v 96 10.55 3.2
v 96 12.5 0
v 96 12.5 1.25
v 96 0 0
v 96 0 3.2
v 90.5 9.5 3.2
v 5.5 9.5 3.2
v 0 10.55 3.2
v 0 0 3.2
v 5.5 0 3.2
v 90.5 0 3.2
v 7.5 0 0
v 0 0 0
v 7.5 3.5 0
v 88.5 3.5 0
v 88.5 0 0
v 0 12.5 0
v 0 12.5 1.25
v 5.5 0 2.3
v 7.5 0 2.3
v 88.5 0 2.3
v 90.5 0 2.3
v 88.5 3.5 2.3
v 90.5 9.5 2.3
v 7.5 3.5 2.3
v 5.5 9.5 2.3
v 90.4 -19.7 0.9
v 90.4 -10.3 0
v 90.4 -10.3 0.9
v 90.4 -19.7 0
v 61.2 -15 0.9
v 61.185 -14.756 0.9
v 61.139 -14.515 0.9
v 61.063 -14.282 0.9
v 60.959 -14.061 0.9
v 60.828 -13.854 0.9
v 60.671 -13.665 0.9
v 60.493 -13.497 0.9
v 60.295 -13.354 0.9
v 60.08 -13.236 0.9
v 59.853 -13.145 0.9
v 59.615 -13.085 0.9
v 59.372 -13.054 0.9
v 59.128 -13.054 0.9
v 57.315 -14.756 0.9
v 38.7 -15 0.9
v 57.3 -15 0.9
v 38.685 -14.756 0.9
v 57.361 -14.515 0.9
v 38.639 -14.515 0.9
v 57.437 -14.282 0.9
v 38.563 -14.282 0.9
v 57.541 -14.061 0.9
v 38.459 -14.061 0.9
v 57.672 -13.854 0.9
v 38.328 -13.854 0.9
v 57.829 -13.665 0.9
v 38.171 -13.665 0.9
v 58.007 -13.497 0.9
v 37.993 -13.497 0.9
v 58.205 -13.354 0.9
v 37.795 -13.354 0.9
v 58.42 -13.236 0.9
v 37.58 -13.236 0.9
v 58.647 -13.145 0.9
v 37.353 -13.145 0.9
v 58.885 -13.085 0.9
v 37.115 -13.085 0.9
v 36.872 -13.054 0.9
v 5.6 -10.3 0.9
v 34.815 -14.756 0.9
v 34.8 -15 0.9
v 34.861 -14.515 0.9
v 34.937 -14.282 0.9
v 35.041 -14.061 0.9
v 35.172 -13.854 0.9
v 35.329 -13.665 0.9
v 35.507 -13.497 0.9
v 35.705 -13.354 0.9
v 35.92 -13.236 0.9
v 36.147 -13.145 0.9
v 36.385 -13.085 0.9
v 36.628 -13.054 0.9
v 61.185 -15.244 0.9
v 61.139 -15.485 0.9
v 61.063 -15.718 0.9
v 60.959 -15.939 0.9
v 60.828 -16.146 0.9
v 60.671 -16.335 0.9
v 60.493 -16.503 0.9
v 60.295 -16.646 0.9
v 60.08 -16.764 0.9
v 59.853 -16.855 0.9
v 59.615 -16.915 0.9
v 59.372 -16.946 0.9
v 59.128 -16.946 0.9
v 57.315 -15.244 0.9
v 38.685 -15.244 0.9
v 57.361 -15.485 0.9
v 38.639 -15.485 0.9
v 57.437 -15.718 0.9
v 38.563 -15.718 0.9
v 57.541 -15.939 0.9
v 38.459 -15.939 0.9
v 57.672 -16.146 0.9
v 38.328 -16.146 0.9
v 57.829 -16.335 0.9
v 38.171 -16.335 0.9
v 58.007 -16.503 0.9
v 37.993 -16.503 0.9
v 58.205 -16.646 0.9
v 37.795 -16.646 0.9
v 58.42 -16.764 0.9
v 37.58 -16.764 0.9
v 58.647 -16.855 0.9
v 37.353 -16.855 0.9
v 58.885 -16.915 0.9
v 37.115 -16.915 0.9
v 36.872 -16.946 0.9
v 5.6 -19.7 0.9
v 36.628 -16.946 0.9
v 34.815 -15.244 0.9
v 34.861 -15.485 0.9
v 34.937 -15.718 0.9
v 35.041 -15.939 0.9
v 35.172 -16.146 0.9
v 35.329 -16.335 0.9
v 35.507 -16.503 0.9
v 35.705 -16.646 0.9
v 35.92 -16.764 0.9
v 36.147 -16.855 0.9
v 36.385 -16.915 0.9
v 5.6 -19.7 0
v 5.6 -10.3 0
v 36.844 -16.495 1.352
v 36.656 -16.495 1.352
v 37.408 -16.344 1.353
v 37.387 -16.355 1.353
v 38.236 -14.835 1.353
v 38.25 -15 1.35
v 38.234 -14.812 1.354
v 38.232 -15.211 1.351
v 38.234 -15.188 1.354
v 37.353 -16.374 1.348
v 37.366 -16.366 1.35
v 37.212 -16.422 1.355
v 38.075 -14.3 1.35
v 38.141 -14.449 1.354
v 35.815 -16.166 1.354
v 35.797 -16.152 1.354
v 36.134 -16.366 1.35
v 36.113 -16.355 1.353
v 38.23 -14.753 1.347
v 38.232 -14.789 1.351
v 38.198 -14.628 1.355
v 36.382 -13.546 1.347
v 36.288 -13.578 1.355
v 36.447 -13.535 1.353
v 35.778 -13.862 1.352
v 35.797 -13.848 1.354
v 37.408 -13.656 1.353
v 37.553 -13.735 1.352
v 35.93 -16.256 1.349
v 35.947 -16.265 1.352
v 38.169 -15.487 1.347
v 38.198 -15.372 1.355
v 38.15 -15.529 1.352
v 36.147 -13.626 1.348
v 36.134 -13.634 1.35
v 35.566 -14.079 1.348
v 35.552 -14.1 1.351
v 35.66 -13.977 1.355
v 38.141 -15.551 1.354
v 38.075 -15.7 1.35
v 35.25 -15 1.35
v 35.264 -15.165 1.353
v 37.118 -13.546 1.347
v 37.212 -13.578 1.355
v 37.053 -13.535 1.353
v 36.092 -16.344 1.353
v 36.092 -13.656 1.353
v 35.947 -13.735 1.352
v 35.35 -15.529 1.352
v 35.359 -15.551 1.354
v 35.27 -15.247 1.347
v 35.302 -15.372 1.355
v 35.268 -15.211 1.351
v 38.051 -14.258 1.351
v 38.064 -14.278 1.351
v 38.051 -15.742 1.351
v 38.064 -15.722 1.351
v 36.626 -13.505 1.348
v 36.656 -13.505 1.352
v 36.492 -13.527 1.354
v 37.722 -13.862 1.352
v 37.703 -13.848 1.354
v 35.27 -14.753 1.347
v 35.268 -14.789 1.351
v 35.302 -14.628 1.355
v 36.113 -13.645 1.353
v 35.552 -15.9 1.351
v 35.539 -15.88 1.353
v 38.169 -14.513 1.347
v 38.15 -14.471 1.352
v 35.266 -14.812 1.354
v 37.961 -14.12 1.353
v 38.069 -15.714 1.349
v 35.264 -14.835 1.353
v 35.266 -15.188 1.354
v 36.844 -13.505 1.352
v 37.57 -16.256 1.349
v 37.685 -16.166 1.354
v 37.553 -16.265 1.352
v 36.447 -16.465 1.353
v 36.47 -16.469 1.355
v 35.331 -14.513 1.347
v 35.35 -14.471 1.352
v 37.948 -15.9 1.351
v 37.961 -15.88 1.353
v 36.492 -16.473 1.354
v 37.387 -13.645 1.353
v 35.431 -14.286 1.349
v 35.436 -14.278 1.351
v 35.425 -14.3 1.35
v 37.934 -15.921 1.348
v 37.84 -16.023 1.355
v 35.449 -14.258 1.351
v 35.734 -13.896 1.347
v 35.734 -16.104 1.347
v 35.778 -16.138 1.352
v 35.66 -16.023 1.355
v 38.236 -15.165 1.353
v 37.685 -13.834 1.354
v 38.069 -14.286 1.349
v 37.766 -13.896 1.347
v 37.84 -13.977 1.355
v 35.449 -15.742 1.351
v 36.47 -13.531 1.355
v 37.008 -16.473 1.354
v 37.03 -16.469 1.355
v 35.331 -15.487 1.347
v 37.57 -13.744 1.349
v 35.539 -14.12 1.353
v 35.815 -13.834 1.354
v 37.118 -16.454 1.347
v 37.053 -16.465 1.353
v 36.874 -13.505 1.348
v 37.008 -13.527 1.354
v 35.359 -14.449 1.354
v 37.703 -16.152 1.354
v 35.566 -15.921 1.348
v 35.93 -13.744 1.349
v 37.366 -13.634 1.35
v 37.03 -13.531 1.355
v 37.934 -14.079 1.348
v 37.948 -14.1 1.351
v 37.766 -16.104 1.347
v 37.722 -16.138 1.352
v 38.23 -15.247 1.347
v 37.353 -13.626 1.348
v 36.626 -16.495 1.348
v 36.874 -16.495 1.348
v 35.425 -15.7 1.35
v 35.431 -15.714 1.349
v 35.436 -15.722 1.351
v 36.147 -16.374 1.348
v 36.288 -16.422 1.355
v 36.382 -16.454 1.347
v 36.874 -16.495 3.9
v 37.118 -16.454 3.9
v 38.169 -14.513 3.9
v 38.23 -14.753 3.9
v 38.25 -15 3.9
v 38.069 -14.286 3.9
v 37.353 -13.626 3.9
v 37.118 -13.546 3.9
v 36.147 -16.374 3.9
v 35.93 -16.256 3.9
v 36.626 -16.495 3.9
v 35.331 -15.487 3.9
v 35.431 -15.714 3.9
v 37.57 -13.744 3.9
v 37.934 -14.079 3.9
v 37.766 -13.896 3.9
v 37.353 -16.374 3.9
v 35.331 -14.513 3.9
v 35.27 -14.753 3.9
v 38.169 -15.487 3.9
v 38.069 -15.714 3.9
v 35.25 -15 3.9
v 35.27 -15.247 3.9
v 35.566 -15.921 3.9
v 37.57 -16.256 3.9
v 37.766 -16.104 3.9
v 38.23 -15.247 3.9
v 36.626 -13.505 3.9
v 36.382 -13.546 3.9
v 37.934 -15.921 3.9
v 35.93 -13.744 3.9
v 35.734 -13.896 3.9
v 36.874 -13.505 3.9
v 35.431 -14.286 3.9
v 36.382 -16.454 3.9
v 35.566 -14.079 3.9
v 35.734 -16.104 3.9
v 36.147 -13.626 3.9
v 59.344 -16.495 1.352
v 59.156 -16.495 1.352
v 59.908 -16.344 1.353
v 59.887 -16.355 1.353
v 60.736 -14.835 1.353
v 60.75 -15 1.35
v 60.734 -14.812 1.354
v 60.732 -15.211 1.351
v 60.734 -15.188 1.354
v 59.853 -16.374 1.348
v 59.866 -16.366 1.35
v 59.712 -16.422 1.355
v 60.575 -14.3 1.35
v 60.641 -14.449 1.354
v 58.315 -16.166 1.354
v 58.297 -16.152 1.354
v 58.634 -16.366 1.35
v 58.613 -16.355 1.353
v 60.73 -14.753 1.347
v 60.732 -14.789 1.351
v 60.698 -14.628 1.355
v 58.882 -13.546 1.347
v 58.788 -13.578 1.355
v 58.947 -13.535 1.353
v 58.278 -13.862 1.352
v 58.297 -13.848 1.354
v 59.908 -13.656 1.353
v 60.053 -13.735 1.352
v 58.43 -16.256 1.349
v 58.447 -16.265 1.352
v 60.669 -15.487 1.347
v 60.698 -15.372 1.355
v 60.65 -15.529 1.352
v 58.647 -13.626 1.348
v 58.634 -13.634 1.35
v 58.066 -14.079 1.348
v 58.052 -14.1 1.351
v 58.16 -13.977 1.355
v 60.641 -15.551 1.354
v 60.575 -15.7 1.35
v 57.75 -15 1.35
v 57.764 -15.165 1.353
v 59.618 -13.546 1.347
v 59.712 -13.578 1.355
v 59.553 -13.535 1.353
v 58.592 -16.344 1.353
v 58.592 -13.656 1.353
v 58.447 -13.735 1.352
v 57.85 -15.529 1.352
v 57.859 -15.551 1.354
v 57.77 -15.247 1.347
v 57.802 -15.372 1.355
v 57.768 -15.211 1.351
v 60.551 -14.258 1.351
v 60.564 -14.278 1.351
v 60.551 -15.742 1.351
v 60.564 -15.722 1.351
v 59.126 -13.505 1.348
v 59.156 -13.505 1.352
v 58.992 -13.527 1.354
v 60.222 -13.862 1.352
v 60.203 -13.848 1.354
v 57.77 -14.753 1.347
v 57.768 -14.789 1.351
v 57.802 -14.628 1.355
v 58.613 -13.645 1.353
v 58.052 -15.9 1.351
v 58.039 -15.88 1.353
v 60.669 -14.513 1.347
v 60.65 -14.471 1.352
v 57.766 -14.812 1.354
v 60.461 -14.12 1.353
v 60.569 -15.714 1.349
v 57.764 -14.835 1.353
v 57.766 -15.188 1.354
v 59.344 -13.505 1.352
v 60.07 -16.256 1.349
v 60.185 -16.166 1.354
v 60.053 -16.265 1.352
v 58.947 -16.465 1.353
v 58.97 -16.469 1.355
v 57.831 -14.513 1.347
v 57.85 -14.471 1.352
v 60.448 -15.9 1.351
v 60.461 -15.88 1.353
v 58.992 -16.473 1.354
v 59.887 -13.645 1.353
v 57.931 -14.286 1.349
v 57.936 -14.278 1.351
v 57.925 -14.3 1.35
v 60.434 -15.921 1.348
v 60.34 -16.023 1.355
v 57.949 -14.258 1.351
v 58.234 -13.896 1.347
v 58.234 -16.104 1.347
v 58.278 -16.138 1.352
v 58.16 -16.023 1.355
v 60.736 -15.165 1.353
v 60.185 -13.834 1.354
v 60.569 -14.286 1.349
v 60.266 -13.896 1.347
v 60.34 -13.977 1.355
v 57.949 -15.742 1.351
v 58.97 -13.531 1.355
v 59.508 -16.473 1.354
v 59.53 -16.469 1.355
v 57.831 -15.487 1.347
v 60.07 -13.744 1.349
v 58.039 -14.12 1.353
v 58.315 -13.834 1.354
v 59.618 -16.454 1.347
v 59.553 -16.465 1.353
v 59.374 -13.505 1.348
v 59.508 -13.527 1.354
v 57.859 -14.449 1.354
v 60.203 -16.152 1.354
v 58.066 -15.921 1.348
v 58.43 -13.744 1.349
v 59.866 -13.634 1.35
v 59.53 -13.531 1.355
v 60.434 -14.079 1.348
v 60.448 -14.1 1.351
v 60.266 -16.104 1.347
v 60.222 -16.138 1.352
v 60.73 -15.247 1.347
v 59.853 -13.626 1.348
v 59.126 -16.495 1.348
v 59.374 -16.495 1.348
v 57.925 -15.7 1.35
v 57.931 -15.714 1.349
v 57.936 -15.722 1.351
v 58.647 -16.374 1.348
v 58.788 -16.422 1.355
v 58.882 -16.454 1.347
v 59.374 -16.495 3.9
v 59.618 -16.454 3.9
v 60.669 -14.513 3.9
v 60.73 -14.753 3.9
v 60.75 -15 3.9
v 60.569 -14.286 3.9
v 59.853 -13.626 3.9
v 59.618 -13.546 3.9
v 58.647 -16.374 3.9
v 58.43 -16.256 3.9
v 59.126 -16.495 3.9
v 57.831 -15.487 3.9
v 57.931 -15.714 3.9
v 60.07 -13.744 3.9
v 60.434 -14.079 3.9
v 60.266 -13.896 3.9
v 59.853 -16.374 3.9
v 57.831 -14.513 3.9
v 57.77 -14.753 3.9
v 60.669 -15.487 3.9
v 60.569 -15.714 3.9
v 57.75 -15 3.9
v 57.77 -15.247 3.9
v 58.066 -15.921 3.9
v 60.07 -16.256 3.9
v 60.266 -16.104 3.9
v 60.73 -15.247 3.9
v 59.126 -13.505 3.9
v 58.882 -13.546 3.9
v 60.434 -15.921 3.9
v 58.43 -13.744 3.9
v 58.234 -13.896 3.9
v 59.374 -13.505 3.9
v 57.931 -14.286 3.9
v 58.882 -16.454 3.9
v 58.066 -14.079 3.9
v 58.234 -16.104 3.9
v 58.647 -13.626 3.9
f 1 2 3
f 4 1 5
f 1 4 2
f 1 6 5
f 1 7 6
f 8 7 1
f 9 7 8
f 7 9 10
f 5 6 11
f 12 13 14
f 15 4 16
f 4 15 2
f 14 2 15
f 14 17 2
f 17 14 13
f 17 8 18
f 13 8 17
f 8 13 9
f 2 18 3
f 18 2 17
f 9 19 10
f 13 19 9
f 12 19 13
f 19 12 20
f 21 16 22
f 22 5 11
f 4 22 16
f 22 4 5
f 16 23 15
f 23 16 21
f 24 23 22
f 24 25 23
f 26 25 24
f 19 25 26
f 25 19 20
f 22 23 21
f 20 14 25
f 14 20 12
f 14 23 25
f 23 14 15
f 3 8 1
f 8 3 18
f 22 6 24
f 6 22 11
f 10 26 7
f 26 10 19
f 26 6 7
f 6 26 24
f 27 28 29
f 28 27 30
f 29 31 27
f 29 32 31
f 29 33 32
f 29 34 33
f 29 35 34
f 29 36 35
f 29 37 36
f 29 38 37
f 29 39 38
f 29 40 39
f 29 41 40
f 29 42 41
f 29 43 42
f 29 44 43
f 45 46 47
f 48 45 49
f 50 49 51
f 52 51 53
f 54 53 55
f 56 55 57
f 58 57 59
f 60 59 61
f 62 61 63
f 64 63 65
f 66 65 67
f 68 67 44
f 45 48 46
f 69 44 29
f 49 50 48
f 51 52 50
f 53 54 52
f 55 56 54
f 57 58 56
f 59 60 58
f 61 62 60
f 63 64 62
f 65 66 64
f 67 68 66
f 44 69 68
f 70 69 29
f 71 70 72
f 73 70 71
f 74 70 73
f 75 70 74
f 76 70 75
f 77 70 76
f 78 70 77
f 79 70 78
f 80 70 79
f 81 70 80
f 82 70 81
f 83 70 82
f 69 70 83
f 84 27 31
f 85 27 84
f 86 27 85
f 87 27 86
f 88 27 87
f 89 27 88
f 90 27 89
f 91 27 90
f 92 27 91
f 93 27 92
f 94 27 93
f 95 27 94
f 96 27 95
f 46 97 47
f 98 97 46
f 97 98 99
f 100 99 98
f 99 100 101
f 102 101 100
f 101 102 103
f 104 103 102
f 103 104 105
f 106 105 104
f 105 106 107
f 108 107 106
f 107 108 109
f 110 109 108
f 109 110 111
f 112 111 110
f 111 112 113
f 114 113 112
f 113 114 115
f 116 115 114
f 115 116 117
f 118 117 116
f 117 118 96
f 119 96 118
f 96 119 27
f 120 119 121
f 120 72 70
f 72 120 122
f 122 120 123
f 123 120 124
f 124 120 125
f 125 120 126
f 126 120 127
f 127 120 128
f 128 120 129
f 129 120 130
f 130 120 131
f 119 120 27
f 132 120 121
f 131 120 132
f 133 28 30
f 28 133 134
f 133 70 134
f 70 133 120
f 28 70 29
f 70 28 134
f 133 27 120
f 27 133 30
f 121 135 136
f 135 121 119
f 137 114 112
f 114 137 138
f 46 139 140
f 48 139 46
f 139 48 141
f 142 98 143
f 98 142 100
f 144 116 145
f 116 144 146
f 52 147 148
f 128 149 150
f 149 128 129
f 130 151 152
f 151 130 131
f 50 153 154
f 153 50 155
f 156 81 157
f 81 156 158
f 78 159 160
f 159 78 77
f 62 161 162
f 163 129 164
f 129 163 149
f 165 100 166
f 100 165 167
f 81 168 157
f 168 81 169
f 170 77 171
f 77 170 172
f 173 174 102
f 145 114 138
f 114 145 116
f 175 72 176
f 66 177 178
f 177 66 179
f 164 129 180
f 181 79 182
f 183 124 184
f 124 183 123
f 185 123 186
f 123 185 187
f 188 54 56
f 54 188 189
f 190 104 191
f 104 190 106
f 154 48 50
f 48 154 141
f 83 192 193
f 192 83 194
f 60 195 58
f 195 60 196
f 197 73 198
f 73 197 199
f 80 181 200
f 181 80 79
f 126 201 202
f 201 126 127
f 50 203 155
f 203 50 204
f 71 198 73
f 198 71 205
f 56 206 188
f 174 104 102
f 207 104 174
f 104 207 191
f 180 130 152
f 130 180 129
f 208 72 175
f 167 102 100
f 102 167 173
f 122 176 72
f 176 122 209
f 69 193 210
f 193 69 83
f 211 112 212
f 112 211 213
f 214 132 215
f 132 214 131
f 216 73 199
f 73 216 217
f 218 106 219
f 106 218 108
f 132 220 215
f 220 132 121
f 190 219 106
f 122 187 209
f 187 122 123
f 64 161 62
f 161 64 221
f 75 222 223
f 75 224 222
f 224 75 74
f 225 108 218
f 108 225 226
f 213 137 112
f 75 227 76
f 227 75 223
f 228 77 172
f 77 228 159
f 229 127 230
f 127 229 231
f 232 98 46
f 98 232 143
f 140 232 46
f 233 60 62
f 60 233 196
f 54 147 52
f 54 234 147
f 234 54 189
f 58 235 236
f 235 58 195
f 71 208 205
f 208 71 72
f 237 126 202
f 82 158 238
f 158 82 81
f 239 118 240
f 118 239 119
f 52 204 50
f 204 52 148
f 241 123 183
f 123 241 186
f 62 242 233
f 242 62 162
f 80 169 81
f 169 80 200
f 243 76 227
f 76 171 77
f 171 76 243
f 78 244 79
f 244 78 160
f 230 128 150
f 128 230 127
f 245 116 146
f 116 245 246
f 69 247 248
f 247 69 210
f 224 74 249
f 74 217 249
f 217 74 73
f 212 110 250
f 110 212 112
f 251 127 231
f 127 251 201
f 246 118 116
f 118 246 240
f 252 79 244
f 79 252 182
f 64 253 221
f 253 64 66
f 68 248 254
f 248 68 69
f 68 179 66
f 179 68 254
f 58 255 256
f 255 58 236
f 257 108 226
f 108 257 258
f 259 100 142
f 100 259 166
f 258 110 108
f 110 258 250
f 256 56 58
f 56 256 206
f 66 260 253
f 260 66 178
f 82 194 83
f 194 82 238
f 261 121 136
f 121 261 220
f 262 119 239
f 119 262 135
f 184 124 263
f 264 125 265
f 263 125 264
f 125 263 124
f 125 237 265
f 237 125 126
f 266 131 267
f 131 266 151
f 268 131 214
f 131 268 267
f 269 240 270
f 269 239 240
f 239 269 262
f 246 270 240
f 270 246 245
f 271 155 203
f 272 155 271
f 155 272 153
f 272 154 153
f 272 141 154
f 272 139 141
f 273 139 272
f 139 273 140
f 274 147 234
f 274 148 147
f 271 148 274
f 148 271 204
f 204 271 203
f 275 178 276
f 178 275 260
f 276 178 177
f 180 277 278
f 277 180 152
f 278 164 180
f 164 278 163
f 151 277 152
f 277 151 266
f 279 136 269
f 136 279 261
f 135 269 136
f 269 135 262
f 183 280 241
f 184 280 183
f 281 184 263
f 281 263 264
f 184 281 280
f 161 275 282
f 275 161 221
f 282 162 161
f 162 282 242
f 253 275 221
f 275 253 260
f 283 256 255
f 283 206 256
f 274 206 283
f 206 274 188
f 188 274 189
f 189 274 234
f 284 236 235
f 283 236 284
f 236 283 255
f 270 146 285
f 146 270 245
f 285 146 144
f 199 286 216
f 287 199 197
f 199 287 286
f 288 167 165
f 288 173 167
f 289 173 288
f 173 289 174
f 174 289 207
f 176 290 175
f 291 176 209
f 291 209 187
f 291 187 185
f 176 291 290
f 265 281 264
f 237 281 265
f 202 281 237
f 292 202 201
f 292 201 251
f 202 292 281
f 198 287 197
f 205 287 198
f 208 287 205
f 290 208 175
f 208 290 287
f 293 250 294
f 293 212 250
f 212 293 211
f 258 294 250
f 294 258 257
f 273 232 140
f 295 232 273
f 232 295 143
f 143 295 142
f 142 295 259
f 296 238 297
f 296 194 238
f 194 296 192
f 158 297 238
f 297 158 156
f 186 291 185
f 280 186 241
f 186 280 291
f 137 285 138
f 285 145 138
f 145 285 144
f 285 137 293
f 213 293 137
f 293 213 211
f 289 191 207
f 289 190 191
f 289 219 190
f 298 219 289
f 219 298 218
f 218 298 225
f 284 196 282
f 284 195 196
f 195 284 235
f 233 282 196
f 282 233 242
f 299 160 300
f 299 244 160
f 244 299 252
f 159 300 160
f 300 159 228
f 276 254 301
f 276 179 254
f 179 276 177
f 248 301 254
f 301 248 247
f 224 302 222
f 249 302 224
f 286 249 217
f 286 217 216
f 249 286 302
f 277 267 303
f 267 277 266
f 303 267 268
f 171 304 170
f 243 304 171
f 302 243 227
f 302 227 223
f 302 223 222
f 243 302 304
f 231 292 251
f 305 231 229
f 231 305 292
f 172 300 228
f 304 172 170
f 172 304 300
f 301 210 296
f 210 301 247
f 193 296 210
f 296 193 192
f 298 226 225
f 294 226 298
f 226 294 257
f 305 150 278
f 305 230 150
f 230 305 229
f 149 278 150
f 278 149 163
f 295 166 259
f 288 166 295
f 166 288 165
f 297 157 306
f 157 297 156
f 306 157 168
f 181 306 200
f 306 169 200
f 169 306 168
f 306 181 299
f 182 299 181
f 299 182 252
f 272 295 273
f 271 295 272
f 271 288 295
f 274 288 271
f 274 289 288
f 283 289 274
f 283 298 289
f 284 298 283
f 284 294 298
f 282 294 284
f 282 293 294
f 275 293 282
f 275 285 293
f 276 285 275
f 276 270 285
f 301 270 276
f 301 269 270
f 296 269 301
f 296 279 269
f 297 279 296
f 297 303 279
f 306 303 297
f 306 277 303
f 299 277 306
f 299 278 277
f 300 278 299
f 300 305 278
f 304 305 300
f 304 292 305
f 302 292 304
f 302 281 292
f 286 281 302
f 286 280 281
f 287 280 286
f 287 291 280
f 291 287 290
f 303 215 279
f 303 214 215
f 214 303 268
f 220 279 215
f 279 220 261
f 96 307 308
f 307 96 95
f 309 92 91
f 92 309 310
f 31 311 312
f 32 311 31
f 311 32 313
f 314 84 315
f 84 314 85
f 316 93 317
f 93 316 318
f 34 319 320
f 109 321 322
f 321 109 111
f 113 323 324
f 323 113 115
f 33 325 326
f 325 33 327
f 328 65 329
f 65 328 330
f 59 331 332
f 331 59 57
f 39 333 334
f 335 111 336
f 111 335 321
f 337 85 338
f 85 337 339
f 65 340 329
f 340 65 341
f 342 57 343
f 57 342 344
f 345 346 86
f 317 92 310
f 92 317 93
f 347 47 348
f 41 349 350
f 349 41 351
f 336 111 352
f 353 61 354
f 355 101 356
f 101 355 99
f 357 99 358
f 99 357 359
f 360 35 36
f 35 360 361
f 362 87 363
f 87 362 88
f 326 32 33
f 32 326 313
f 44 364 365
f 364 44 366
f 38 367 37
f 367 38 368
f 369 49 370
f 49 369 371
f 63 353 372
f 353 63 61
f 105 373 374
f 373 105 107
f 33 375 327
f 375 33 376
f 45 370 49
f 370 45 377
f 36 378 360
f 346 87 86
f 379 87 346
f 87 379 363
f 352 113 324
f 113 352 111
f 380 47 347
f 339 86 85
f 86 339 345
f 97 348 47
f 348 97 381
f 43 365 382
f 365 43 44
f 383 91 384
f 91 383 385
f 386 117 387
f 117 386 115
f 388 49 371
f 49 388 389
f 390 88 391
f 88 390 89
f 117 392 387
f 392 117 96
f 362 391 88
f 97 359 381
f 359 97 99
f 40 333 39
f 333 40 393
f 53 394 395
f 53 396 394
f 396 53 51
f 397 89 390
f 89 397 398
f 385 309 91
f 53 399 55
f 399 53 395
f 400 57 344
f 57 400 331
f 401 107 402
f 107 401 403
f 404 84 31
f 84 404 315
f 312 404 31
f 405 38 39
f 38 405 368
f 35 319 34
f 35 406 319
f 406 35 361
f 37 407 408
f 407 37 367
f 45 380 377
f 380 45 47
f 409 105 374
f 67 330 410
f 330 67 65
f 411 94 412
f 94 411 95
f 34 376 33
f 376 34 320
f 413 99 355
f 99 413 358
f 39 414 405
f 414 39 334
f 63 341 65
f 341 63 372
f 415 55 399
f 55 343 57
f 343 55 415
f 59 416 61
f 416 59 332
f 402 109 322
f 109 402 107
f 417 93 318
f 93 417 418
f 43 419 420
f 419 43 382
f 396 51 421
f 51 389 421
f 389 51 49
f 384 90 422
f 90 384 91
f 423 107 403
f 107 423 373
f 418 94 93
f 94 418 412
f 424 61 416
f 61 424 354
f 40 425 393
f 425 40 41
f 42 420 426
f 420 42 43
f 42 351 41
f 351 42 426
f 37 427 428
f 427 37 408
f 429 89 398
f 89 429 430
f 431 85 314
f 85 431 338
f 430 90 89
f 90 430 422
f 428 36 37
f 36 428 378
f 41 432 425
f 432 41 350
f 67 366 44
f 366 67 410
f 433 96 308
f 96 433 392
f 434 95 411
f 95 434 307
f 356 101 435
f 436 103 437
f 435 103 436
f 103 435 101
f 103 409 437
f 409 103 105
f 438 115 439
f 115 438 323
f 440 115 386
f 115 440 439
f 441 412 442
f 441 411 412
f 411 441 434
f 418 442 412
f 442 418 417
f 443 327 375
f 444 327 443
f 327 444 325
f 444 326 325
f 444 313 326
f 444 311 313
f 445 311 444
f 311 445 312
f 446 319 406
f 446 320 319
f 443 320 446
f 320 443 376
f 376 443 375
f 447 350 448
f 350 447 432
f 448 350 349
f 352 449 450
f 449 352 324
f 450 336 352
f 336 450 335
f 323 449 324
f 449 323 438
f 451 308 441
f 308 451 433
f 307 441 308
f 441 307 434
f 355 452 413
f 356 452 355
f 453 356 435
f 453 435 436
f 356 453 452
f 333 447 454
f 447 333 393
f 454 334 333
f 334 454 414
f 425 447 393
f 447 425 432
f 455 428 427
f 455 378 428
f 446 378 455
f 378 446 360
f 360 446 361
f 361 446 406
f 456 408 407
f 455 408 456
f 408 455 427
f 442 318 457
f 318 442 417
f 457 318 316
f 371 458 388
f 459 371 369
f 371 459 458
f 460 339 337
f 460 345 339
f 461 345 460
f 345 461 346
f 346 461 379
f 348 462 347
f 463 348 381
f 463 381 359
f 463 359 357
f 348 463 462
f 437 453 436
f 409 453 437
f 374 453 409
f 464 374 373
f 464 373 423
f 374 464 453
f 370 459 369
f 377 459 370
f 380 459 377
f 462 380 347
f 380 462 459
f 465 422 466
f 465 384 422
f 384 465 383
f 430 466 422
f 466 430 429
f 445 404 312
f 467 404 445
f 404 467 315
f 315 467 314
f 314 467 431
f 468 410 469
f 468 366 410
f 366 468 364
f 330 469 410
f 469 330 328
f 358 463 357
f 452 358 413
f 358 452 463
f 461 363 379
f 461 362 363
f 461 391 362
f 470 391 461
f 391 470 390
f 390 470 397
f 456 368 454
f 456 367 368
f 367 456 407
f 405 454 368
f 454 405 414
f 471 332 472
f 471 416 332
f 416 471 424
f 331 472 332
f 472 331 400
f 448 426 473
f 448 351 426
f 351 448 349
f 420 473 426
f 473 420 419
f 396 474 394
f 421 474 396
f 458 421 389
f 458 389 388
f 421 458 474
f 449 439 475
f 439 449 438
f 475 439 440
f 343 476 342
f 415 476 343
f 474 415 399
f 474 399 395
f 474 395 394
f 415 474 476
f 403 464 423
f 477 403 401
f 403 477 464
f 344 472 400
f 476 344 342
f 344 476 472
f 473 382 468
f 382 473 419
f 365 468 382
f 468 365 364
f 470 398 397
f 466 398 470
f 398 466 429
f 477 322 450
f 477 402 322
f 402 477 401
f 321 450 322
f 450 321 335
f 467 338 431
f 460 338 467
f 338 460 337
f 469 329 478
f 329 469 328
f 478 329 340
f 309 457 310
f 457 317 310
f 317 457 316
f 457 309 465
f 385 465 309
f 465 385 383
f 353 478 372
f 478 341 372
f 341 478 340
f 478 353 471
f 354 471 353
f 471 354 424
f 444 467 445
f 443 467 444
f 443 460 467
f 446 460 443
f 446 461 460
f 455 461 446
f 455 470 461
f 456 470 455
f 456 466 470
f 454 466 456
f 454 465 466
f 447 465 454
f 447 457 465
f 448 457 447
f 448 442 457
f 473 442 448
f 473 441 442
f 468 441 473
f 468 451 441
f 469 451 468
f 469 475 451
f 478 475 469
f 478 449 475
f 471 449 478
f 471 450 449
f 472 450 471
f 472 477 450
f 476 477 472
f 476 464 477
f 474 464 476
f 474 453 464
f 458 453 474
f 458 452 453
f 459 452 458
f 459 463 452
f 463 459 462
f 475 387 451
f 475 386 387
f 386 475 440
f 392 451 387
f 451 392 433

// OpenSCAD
/* HP Front Panel Top Trim (single unit width)
 * 
 * Works with 59303A DAC, which is a mid-70's half-width unit (half the width of, say, a 3478A)
 *
 * Two model options are provided: "single model" and "separated model"
 *
 * For SLA printers the "single model" will probably be best, since layering isn't an issue there.
 *
 * For FDM printers the "split model" is nice, since it eliminates the need for printing overhangs and makes 
 *   the visible surface of both the panel and its recessed portion nice looking, especially if you're using
 *   a textured printing surface for printing. This model can easily be glued together with CA glue or your
 *   adhesive of choice
 */
 
/*[ Panel Dimensions]*/ 
// HP 59303A Dimensions
panel_length = 96;
panel_width = 12.5;
panel_depth = 3.2;

/*[ Panel Lip Dimensions]*/
// HP 59303A Dimensions
lip_length = 81;
lip_width = 3.5;
lip_depth = 2.3;

/*[ Panel Bezel Dimensions]*/
// HP 59303A Dimensions
bezel_z_offset = 0.75;
bezel_y_offset = 13;
bezel_rotation = 45;

/*[ Post Positions and Dimensions]*/
// HP 59303A Dimensions
center_post = false;
post_spacing = 11.25;  // From center point
post_depth = 3;
post_diameter = 2.9;
post_bezel_height = 0.5;

/*[ Split Model Dimensions]*/
// HP 59303A Dimensions
model_two_y_offset = -15;
split_length = 85;
split_width = 9.5;
split_tolerance = 0.1;

module __customizer_limit__() {} // End Customizer vars
// Global Variables
$fs = 0.25; // Set facet size to 0.02mm for relatively high arc resolution
$fa = 5;  // Set max facet angle to 2.5 degrees for relatively high arc resolution

lip_thickness = panel_depth - lip_depth;

// Initial Model
module single_model() {
    union() {
        
        // Main panel and cutouts
        difference() {
            // Main panel
            cube([panel_length, panel_width, panel_depth]);
            
            // Lip Cutout
            translate([panel_length/2, lip_width/2, lip_depth/2]) 
                cube([lip_length, lip_width, lip_depth], center = true);
            
            // Bottom-Front Edge Bevel Cutout
            translate([0, bezel_y_offset, bezel_z_offset]) rotate([bezel_rotation, 0, 0]) 
                cube([panel_length, 10, 10]);
        }
        
        // Left Post
        translate([(panel_length/2) - post_spacing, panel_width/2, 3]) 
            cylinder(h = post_bezel_height, r1 = post_diameter/2 + post_bezel_height, r2 = post_diameter/2, center = false);
        translate([(panel_length/2) - post_spacing, panel_width/2, 3])
            cylinder(h = post_depth, r = 1.5, center = false);
        
        // Right Post
        translate([(panel_length/2) + post_spacing, panel_width/2, 3]) 
            cylinder(h = post_bezel_height, r1 = post_diameter/2 + post_bezel_height, r2 = post_diameter/2, center = false);
        translate([(panel_length/2) + post_spacing, panel_width/2, 3]) 
            cylinder(h = post_depth, r = post_diameter/2, center = false);

    }
}

module split_model() {
    union() {
        difference() {
            // Main panel
            cube([panel_length, panel_width, panel_depth]);
            
            // Lip Cutout
            translate([panel_length/2, lip_width/2, lip_depth/2]) 
                cube([lip_length, lip_width, lip_depth], center = true);
            
            // Bottom-Front Edge Bevel Cutout
            translate([0, bezel_y_offset, bezel_z_offset]) rotate([bezel_rotation, 0, 0]) 
                cube([panel_length, 10, 10]);
            
            // Part 2 Cutout
            translate([panel_length/2, split_width/2, lip_depth + ((lip_thickness)/2)]) 
                cube([split_length, split_width, panel_depth - lip_depth], center = true);
        }
    }
    
    // Secondary Plate
    translate([0, model_two_y_offset, 0])
        union() {
            translate([panel_length/2, 0, lip_thickness/2]) 
                cube([split_length - (split_tolerance * 2), split_width - split_tolerance, lip_thickness], center = true);
            
            // Left Post
            translate([(panel_length/2) - post_spacing, 0, lip_thickness]) 
                cylinder(h = post_bezel_height, r1 = post_diameter/2 + post_bezel_height, r2 = post_diameter/2, center = false);
            translate([(panel_length/2) - post_spacing, 0, lip_thickness])
                cylinder(h = post_depth, r = 1.5, center = false);
            
            // Right Post
            translate([(panel_length/2) + post_spacing, 0, lip_thickness]) 
                cylinder(h = post_bezel_height, r1 = post_diameter/2 + post_bezel_height, r2 = post_diameter/2, center = false);
            translate([(panel_length/2) + post_spacing, 0, lip_thickness])
                cylinder(h = post_depth, r = 1.5, center = false);
        }

}

//single_model();

split_model();
